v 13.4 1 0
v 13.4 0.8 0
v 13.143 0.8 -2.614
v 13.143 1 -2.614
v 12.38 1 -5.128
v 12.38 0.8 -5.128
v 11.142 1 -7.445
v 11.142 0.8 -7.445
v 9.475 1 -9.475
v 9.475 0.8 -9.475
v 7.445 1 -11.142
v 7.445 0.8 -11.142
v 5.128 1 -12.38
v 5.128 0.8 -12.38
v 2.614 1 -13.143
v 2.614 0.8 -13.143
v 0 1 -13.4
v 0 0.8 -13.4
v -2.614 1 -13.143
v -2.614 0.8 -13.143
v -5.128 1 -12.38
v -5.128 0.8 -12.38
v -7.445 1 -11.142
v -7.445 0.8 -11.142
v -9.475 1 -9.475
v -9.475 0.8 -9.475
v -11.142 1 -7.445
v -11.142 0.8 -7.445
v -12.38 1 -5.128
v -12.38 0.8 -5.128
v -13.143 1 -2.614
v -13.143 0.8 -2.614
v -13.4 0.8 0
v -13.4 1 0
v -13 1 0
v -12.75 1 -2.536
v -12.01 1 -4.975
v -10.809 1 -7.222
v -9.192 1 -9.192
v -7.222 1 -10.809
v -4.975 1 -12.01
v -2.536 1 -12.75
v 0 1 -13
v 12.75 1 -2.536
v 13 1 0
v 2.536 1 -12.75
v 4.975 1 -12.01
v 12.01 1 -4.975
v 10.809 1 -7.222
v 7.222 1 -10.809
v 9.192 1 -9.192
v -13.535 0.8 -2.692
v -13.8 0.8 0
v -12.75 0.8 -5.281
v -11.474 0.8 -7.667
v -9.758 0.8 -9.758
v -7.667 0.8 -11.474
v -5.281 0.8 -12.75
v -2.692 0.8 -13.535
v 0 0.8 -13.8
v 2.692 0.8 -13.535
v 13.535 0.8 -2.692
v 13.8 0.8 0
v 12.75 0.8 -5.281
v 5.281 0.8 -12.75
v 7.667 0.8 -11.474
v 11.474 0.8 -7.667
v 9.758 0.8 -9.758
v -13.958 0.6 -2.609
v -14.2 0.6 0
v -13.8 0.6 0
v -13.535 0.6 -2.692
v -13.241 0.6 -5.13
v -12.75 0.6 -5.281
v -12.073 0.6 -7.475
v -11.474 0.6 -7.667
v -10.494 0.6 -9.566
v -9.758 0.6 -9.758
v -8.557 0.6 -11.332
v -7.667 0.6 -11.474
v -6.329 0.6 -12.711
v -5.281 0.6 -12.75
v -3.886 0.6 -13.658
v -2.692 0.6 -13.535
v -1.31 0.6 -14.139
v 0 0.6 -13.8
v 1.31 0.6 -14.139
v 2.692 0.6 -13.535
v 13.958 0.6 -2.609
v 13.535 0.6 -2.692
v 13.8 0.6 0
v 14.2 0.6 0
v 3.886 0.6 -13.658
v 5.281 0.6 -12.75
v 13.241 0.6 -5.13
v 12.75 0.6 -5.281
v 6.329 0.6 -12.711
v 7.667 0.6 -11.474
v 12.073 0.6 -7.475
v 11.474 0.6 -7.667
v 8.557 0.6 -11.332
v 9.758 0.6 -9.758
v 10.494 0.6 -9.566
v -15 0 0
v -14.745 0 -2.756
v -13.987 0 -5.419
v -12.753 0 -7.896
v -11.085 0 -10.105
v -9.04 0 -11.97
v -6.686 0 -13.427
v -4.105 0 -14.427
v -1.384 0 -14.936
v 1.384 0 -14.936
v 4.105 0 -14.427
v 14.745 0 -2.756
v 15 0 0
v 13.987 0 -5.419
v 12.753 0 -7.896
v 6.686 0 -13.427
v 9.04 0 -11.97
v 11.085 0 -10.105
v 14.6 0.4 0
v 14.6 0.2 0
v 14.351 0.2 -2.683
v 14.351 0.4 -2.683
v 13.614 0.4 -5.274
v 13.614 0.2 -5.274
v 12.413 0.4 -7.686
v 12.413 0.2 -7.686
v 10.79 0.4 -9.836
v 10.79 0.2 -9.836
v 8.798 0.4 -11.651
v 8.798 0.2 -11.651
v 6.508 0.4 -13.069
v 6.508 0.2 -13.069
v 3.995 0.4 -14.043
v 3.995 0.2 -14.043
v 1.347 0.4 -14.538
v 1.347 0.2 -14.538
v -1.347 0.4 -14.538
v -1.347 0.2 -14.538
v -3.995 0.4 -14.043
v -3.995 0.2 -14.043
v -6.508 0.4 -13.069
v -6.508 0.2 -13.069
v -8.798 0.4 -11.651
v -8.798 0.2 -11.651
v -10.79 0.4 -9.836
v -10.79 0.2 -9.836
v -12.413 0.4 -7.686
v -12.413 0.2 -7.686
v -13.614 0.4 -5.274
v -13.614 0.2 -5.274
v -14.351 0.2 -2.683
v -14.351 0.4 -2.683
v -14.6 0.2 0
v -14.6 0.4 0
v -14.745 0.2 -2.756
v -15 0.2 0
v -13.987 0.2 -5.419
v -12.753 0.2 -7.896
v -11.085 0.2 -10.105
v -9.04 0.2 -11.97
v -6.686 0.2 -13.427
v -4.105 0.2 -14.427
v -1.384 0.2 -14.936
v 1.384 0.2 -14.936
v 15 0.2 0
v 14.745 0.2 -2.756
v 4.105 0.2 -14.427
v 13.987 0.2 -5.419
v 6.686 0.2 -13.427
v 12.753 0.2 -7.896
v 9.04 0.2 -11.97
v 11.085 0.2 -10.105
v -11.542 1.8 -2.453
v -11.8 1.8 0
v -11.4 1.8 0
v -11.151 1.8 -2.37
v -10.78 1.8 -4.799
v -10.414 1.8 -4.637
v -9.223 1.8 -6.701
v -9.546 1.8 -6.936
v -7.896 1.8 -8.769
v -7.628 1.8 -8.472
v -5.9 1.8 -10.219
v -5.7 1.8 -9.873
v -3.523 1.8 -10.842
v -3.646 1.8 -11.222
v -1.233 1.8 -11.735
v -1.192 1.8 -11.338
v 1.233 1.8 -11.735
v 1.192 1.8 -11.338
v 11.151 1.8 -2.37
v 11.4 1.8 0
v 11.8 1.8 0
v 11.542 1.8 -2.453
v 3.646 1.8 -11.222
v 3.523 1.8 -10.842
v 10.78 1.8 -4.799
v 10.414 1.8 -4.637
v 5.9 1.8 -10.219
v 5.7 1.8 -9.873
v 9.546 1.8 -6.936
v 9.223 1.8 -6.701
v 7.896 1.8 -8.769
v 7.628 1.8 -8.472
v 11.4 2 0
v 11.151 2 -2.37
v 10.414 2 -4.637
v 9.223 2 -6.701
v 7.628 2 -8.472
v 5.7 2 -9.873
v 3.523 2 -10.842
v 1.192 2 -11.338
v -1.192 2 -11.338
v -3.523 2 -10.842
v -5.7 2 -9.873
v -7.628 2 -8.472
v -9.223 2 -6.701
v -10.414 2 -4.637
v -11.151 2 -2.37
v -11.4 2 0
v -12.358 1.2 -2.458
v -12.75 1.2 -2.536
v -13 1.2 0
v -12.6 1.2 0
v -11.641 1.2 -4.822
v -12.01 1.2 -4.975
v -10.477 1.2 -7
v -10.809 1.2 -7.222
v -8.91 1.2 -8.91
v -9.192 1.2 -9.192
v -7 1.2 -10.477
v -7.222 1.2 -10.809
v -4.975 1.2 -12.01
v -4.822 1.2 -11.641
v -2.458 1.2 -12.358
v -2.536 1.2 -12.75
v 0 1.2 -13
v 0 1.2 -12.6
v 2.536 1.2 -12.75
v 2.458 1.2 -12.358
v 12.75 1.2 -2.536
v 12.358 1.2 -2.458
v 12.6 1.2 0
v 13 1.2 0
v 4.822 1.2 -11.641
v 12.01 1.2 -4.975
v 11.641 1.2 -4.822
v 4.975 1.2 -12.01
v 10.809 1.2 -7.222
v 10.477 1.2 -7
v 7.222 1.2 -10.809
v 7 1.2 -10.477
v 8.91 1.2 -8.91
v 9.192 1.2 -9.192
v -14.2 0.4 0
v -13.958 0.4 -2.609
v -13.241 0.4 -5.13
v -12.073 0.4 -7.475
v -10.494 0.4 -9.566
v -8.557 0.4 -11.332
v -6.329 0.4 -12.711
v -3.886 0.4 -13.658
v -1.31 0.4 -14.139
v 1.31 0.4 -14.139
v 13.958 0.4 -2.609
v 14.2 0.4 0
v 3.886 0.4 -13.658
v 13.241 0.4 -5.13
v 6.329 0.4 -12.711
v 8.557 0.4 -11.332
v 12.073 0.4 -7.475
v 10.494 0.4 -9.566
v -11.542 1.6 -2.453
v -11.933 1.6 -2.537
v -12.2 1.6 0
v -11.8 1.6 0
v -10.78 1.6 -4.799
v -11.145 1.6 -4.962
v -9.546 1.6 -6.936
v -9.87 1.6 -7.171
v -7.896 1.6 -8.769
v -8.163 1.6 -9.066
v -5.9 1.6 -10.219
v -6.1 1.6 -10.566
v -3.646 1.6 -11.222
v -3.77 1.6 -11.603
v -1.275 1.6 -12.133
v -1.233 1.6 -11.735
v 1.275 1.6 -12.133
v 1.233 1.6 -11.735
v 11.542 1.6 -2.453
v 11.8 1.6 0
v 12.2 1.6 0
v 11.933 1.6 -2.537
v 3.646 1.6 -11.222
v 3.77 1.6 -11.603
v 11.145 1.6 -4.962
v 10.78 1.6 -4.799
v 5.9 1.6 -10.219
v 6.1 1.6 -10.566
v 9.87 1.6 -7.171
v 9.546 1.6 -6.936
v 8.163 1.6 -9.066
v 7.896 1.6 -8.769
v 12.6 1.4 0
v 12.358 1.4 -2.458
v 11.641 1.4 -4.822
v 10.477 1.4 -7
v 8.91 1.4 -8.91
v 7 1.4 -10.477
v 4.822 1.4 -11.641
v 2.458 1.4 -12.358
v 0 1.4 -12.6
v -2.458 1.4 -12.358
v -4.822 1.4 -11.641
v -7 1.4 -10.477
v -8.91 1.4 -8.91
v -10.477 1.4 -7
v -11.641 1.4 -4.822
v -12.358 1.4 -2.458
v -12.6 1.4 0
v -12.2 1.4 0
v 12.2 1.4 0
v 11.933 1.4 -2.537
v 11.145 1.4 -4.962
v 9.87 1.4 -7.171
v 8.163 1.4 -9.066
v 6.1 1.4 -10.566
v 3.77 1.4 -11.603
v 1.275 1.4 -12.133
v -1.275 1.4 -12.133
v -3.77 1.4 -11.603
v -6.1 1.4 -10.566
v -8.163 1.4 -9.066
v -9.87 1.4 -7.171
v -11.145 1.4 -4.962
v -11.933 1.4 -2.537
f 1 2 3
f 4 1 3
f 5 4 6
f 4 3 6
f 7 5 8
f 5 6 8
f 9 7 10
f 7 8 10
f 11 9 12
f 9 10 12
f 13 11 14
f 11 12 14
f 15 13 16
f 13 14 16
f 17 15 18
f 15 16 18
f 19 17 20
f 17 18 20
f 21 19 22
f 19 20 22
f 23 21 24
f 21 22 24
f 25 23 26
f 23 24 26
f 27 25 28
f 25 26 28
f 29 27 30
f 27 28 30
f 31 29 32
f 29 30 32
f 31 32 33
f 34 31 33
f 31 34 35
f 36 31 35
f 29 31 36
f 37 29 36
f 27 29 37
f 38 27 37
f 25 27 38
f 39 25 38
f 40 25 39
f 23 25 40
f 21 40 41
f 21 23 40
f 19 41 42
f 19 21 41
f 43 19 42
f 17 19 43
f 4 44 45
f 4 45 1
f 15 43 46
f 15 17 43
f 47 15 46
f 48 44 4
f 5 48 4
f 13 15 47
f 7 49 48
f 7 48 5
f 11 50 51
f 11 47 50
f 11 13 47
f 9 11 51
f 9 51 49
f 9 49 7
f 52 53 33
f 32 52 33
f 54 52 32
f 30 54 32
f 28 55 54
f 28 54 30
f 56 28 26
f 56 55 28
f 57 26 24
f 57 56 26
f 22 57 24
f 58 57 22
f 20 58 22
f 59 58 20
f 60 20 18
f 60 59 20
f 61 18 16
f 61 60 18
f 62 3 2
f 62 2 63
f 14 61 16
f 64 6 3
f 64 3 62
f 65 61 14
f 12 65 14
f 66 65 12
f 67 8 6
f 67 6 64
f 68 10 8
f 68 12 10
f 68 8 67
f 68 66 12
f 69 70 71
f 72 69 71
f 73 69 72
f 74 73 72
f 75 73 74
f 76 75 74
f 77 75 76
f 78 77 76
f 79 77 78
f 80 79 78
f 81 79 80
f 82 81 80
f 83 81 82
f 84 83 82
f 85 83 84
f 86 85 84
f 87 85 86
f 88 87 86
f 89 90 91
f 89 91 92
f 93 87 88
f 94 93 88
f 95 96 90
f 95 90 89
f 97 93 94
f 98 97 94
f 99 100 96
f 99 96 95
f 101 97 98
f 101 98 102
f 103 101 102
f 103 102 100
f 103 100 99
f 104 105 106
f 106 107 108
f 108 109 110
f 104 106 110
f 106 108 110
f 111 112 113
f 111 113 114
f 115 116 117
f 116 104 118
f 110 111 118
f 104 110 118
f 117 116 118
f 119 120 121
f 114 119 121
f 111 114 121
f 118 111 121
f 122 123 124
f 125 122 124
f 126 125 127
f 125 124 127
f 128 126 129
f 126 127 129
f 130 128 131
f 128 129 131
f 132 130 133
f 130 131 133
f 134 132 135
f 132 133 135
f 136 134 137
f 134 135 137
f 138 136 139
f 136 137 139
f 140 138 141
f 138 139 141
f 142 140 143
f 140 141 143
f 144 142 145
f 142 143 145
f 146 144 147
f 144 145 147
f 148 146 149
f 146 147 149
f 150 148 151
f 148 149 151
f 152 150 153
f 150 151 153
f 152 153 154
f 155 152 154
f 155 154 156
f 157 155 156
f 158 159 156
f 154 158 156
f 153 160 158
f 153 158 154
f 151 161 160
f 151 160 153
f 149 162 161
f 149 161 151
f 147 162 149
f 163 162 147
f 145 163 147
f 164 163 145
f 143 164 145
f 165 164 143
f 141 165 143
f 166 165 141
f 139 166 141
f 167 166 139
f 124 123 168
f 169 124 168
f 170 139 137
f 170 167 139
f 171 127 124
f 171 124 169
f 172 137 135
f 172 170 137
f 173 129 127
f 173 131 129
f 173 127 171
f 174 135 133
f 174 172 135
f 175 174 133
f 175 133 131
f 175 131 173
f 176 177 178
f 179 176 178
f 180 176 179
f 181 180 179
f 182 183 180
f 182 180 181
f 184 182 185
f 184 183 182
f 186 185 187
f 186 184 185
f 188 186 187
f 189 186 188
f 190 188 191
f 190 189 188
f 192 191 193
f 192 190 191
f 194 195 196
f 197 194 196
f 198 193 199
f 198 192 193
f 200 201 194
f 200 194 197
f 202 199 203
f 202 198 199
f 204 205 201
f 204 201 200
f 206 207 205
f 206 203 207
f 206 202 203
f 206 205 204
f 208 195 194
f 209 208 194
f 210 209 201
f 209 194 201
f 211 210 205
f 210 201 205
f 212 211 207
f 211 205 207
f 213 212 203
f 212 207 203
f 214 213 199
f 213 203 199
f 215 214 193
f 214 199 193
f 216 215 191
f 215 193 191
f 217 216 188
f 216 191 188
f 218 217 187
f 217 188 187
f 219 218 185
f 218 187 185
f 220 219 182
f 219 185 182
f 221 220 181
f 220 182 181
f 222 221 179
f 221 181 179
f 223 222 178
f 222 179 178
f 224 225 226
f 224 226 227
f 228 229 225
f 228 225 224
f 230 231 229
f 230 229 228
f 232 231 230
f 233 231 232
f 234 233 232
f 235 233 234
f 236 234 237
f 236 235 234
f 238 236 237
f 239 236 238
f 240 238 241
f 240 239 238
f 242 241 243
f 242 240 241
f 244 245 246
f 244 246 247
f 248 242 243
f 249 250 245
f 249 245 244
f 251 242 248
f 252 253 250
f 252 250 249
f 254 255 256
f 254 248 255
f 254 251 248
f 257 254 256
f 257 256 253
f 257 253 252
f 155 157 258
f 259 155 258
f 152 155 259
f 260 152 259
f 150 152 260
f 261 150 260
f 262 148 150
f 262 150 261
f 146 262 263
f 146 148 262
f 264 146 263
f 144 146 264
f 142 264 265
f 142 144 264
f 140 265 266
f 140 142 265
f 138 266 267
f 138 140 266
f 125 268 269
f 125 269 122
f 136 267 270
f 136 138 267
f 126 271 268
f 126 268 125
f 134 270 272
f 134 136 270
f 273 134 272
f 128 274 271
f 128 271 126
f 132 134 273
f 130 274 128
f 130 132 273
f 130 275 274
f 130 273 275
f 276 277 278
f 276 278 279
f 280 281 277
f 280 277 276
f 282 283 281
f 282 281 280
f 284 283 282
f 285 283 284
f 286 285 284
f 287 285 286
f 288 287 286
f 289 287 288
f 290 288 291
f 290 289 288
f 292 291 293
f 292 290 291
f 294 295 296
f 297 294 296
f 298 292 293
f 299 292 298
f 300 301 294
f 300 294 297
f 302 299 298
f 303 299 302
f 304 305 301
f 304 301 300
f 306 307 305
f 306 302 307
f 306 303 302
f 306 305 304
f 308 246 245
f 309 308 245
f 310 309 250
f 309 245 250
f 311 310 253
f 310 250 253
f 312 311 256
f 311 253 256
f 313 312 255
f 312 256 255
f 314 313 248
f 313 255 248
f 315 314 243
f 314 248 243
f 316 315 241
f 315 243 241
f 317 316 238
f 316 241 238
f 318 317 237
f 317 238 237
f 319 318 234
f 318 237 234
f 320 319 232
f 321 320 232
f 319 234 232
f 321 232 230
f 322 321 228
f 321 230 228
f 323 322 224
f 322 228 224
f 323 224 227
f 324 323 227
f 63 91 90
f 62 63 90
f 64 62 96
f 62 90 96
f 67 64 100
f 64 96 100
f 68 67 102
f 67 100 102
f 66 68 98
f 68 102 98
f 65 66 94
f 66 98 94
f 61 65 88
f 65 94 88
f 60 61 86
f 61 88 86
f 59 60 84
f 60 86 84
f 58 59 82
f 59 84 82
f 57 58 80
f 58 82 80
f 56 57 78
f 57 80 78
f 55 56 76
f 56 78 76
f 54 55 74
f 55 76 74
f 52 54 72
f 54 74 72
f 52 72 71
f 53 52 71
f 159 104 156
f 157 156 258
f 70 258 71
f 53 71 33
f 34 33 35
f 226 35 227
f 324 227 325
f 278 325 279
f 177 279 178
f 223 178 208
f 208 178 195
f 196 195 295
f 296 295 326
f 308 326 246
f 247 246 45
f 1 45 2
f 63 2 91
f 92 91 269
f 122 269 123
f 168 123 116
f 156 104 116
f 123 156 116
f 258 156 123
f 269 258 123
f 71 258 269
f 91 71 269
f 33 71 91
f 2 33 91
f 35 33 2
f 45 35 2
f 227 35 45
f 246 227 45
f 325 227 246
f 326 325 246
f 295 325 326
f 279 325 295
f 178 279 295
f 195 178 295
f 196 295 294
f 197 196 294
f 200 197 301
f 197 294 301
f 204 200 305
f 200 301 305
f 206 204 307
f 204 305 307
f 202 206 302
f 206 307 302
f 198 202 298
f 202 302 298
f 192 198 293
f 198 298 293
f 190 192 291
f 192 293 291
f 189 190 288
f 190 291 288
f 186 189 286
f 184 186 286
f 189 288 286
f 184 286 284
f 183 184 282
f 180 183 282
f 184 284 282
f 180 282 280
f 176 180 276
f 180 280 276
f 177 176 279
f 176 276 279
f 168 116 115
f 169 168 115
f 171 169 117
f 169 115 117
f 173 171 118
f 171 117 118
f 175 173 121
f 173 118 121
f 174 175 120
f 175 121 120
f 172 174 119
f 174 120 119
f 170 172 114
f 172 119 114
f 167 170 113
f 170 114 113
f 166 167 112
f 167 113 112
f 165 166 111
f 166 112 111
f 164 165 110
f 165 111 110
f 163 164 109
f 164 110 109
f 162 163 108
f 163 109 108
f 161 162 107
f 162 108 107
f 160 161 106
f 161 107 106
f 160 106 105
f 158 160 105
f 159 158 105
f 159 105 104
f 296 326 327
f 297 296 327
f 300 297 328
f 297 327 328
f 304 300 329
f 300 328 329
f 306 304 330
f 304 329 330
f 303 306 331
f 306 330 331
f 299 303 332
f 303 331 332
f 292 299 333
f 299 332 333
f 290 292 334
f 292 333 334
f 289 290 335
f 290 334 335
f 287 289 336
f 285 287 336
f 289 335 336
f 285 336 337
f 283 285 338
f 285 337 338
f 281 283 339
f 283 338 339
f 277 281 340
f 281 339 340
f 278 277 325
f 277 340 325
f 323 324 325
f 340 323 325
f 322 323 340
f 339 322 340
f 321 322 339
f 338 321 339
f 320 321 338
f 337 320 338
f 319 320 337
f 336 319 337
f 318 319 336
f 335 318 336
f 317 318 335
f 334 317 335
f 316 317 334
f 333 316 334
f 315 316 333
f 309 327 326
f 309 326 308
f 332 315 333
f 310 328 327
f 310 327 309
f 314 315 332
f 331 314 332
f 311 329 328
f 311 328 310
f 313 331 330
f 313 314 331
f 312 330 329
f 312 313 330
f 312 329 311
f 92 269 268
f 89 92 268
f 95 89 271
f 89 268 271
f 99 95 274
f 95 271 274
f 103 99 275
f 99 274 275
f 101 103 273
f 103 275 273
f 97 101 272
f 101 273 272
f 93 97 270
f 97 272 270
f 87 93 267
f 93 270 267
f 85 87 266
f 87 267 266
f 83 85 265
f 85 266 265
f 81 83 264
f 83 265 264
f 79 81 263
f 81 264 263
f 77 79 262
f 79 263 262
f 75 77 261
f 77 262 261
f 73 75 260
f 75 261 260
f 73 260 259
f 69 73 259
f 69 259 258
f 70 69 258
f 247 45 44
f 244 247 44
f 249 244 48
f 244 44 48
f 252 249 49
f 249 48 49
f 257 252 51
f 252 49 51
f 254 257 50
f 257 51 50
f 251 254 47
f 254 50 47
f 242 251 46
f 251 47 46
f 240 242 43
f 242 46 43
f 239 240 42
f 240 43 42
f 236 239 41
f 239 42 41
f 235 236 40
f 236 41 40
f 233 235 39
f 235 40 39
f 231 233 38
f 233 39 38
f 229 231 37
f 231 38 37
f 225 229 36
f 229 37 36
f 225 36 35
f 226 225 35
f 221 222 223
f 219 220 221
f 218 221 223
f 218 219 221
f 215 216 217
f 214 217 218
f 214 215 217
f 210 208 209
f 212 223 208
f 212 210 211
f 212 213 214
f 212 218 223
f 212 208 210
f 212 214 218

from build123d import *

# Parameters (mm, degrees)
EXTRUDE_1_DEPTH  = 0.2
EXTRUDE_3_DEPTH  = 0.2
EXTRUDE_4_DEPTH  = 0.2
EXTRUDE_5_DEPTH  = 0.2
EXTRUDE_6_DEPTH  = 0.2
EXTRUDE_7_DEPTH  = 0.2
EXTRUDE_8_DEPTH  = 0.2
EXTRUDE_9_DEPTH  = 0.2
EXTRUDE_10_DEPTH = 0.2
EXTRUDE_11_DEPTH = 0.2


with BuildPart() as part:
    # 草图1 → 凸台-拉伸1 (new body)
    with BuildSketch(Plane(origin=(0, 0, 0), x_dir=(1, 0, 0), z_dir=(0, 1, 0))):
        with BuildLine():
            Line((-15, 0), (15, 0))
            ThreePointArc((15, 0), (0, 15), (-15, 0))
        make_face()
    extrude(amount=EXTRUDE_1_DEPTH)

    # 草图2 → 凸台-拉伸3 (add)
    with BuildSketch(Plane(origin=(0, 0.2, 0), x_dir=(1, 0, 0), z_dir=(0, 1, 0))):
        with BuildLine():
            Line((-14.6, 0), (14.6, 0))
            ThreePointArc((14.6, 0), (0, 14.6), (-14.6, 0))
        make_face()
    extrude(amount=EXTRUDE_3_DEPTH)

    # 草图3 → 凸台-拉伸4 (add)
    with BuildSketch(Plane(origin=(0, 0.4, 0), x_dir=(1, 0, 0), z_dir=(0, 1, 0))):
        with BuildLine():
            Line((-14.2, 0), (14.2, 0))
            ThreePointArc((14.2, 0), (0, 14.2), (-14.2, 0))
        make_face()
    extrude(amount=EXTRUDE_4_DEPTH)

    # 草图4 → 凸台-拉伸5 (add)
    with BuildSketch(Plane(origin=(0, 0.6, 0), x_dir=(1, 0, 0), z_dir=(0, 1, 0))):
        with BuildLine():
            Line((-13.8, 0), (13.8, 0))
            ThreePointArc((13.8, 0), (0, 13.8), (-13.8, 0))
        make_face()
    extrude(amount=EXTRUDE_5_DEPTH)

    # 草图5 → 凸台-拉伸6 (add)
    with BuildSketch(Plane(origin=(0, 0.8, 0), x_dir=(1, 0, 0), z_dir=(0, 1, 0))):
        with BuildLine():
            Line((-13.4, 0), (13.4, 0))
            ThreePointArc((13.4, 0), (0, 13.4), (-13.4, 0))
        make_face()
    extrude(amount=EXTRUDE_6_DEPTH)

    # 草图6 → 凸台-拉伸7 (add)
    with BuildSketch(Plane(origin=(0, 1, 0), x_dir=(1, 0, 0), z_dir=(0, 1, 0))):
        with BuildLine():
            Line((-13, 0), (13, 0))
            ThreePointArc((13, 0), (0, 13), (-13, 0))
        make_face()
    extrude(amount=EXTRUDE_7_DEPTH)

    # 草图7 → 凸台-拉伸8 (add)
    with BuildSketch(Plane(origin=(0, 1.2, 0), x_dir=(1, 0, 0), z_dir=(0, 1, 0))):
        with BuildLine():
            Line((-12.6, 0), (12.6, 0))
            ThreePointArc((12.6, 0), (0, 12.6), (-12.6, 0))
        make_face()
    extrude(amount=EXTRUDE_8_DEPTH)

    # 草图8 → 凸台-拉伸9 (add)
    with BuildSketch(Plane(origin=(0, 1.4, 0), x_dir=(1, 0, 0), z_dir=(0, 1, 0))):
        with BuildLine():
            Line((-12.2, 0), (12.2, 0))
            ThreePointArc((12.2, 0), (0, 12.2), (-12.2, 0))
        make_face()
    extrude(amount=EXTRUDE_9_DEPTH)

    # 草图9 → 凸台-拉伸10 (add)
    with BuildSketch(Plane(origin=(0, 1.6, 0), x_dir=(1, 0, 0), z_dir=(0, 1, 0))):
        with BuildLine():
            Line((-11.8, 0), (11.8, 0))
            ThreePointArc((11.8, 0), (0, 11.8), (-11.8, 0))
        make_face()
    extrude(amount=EXTRUDE_10_DEPTH)

    # 草图10 → 凸台-拉伸11 (add)
    with BuildSketch(Plane(origin=(0, 1.8, 0), x_dir=(1, 0, 0), z_dir=(0, 1, 0))):
        with BuildLine():
            Line((-11.4, 0), (11.4, 0))
            ThreePointArc((11.4, 0), (0, 11.4), (-11.4, 0))
        make_face()
    extrude(amount=EXTRUDE_11_DEPTH)


solid = part.part
